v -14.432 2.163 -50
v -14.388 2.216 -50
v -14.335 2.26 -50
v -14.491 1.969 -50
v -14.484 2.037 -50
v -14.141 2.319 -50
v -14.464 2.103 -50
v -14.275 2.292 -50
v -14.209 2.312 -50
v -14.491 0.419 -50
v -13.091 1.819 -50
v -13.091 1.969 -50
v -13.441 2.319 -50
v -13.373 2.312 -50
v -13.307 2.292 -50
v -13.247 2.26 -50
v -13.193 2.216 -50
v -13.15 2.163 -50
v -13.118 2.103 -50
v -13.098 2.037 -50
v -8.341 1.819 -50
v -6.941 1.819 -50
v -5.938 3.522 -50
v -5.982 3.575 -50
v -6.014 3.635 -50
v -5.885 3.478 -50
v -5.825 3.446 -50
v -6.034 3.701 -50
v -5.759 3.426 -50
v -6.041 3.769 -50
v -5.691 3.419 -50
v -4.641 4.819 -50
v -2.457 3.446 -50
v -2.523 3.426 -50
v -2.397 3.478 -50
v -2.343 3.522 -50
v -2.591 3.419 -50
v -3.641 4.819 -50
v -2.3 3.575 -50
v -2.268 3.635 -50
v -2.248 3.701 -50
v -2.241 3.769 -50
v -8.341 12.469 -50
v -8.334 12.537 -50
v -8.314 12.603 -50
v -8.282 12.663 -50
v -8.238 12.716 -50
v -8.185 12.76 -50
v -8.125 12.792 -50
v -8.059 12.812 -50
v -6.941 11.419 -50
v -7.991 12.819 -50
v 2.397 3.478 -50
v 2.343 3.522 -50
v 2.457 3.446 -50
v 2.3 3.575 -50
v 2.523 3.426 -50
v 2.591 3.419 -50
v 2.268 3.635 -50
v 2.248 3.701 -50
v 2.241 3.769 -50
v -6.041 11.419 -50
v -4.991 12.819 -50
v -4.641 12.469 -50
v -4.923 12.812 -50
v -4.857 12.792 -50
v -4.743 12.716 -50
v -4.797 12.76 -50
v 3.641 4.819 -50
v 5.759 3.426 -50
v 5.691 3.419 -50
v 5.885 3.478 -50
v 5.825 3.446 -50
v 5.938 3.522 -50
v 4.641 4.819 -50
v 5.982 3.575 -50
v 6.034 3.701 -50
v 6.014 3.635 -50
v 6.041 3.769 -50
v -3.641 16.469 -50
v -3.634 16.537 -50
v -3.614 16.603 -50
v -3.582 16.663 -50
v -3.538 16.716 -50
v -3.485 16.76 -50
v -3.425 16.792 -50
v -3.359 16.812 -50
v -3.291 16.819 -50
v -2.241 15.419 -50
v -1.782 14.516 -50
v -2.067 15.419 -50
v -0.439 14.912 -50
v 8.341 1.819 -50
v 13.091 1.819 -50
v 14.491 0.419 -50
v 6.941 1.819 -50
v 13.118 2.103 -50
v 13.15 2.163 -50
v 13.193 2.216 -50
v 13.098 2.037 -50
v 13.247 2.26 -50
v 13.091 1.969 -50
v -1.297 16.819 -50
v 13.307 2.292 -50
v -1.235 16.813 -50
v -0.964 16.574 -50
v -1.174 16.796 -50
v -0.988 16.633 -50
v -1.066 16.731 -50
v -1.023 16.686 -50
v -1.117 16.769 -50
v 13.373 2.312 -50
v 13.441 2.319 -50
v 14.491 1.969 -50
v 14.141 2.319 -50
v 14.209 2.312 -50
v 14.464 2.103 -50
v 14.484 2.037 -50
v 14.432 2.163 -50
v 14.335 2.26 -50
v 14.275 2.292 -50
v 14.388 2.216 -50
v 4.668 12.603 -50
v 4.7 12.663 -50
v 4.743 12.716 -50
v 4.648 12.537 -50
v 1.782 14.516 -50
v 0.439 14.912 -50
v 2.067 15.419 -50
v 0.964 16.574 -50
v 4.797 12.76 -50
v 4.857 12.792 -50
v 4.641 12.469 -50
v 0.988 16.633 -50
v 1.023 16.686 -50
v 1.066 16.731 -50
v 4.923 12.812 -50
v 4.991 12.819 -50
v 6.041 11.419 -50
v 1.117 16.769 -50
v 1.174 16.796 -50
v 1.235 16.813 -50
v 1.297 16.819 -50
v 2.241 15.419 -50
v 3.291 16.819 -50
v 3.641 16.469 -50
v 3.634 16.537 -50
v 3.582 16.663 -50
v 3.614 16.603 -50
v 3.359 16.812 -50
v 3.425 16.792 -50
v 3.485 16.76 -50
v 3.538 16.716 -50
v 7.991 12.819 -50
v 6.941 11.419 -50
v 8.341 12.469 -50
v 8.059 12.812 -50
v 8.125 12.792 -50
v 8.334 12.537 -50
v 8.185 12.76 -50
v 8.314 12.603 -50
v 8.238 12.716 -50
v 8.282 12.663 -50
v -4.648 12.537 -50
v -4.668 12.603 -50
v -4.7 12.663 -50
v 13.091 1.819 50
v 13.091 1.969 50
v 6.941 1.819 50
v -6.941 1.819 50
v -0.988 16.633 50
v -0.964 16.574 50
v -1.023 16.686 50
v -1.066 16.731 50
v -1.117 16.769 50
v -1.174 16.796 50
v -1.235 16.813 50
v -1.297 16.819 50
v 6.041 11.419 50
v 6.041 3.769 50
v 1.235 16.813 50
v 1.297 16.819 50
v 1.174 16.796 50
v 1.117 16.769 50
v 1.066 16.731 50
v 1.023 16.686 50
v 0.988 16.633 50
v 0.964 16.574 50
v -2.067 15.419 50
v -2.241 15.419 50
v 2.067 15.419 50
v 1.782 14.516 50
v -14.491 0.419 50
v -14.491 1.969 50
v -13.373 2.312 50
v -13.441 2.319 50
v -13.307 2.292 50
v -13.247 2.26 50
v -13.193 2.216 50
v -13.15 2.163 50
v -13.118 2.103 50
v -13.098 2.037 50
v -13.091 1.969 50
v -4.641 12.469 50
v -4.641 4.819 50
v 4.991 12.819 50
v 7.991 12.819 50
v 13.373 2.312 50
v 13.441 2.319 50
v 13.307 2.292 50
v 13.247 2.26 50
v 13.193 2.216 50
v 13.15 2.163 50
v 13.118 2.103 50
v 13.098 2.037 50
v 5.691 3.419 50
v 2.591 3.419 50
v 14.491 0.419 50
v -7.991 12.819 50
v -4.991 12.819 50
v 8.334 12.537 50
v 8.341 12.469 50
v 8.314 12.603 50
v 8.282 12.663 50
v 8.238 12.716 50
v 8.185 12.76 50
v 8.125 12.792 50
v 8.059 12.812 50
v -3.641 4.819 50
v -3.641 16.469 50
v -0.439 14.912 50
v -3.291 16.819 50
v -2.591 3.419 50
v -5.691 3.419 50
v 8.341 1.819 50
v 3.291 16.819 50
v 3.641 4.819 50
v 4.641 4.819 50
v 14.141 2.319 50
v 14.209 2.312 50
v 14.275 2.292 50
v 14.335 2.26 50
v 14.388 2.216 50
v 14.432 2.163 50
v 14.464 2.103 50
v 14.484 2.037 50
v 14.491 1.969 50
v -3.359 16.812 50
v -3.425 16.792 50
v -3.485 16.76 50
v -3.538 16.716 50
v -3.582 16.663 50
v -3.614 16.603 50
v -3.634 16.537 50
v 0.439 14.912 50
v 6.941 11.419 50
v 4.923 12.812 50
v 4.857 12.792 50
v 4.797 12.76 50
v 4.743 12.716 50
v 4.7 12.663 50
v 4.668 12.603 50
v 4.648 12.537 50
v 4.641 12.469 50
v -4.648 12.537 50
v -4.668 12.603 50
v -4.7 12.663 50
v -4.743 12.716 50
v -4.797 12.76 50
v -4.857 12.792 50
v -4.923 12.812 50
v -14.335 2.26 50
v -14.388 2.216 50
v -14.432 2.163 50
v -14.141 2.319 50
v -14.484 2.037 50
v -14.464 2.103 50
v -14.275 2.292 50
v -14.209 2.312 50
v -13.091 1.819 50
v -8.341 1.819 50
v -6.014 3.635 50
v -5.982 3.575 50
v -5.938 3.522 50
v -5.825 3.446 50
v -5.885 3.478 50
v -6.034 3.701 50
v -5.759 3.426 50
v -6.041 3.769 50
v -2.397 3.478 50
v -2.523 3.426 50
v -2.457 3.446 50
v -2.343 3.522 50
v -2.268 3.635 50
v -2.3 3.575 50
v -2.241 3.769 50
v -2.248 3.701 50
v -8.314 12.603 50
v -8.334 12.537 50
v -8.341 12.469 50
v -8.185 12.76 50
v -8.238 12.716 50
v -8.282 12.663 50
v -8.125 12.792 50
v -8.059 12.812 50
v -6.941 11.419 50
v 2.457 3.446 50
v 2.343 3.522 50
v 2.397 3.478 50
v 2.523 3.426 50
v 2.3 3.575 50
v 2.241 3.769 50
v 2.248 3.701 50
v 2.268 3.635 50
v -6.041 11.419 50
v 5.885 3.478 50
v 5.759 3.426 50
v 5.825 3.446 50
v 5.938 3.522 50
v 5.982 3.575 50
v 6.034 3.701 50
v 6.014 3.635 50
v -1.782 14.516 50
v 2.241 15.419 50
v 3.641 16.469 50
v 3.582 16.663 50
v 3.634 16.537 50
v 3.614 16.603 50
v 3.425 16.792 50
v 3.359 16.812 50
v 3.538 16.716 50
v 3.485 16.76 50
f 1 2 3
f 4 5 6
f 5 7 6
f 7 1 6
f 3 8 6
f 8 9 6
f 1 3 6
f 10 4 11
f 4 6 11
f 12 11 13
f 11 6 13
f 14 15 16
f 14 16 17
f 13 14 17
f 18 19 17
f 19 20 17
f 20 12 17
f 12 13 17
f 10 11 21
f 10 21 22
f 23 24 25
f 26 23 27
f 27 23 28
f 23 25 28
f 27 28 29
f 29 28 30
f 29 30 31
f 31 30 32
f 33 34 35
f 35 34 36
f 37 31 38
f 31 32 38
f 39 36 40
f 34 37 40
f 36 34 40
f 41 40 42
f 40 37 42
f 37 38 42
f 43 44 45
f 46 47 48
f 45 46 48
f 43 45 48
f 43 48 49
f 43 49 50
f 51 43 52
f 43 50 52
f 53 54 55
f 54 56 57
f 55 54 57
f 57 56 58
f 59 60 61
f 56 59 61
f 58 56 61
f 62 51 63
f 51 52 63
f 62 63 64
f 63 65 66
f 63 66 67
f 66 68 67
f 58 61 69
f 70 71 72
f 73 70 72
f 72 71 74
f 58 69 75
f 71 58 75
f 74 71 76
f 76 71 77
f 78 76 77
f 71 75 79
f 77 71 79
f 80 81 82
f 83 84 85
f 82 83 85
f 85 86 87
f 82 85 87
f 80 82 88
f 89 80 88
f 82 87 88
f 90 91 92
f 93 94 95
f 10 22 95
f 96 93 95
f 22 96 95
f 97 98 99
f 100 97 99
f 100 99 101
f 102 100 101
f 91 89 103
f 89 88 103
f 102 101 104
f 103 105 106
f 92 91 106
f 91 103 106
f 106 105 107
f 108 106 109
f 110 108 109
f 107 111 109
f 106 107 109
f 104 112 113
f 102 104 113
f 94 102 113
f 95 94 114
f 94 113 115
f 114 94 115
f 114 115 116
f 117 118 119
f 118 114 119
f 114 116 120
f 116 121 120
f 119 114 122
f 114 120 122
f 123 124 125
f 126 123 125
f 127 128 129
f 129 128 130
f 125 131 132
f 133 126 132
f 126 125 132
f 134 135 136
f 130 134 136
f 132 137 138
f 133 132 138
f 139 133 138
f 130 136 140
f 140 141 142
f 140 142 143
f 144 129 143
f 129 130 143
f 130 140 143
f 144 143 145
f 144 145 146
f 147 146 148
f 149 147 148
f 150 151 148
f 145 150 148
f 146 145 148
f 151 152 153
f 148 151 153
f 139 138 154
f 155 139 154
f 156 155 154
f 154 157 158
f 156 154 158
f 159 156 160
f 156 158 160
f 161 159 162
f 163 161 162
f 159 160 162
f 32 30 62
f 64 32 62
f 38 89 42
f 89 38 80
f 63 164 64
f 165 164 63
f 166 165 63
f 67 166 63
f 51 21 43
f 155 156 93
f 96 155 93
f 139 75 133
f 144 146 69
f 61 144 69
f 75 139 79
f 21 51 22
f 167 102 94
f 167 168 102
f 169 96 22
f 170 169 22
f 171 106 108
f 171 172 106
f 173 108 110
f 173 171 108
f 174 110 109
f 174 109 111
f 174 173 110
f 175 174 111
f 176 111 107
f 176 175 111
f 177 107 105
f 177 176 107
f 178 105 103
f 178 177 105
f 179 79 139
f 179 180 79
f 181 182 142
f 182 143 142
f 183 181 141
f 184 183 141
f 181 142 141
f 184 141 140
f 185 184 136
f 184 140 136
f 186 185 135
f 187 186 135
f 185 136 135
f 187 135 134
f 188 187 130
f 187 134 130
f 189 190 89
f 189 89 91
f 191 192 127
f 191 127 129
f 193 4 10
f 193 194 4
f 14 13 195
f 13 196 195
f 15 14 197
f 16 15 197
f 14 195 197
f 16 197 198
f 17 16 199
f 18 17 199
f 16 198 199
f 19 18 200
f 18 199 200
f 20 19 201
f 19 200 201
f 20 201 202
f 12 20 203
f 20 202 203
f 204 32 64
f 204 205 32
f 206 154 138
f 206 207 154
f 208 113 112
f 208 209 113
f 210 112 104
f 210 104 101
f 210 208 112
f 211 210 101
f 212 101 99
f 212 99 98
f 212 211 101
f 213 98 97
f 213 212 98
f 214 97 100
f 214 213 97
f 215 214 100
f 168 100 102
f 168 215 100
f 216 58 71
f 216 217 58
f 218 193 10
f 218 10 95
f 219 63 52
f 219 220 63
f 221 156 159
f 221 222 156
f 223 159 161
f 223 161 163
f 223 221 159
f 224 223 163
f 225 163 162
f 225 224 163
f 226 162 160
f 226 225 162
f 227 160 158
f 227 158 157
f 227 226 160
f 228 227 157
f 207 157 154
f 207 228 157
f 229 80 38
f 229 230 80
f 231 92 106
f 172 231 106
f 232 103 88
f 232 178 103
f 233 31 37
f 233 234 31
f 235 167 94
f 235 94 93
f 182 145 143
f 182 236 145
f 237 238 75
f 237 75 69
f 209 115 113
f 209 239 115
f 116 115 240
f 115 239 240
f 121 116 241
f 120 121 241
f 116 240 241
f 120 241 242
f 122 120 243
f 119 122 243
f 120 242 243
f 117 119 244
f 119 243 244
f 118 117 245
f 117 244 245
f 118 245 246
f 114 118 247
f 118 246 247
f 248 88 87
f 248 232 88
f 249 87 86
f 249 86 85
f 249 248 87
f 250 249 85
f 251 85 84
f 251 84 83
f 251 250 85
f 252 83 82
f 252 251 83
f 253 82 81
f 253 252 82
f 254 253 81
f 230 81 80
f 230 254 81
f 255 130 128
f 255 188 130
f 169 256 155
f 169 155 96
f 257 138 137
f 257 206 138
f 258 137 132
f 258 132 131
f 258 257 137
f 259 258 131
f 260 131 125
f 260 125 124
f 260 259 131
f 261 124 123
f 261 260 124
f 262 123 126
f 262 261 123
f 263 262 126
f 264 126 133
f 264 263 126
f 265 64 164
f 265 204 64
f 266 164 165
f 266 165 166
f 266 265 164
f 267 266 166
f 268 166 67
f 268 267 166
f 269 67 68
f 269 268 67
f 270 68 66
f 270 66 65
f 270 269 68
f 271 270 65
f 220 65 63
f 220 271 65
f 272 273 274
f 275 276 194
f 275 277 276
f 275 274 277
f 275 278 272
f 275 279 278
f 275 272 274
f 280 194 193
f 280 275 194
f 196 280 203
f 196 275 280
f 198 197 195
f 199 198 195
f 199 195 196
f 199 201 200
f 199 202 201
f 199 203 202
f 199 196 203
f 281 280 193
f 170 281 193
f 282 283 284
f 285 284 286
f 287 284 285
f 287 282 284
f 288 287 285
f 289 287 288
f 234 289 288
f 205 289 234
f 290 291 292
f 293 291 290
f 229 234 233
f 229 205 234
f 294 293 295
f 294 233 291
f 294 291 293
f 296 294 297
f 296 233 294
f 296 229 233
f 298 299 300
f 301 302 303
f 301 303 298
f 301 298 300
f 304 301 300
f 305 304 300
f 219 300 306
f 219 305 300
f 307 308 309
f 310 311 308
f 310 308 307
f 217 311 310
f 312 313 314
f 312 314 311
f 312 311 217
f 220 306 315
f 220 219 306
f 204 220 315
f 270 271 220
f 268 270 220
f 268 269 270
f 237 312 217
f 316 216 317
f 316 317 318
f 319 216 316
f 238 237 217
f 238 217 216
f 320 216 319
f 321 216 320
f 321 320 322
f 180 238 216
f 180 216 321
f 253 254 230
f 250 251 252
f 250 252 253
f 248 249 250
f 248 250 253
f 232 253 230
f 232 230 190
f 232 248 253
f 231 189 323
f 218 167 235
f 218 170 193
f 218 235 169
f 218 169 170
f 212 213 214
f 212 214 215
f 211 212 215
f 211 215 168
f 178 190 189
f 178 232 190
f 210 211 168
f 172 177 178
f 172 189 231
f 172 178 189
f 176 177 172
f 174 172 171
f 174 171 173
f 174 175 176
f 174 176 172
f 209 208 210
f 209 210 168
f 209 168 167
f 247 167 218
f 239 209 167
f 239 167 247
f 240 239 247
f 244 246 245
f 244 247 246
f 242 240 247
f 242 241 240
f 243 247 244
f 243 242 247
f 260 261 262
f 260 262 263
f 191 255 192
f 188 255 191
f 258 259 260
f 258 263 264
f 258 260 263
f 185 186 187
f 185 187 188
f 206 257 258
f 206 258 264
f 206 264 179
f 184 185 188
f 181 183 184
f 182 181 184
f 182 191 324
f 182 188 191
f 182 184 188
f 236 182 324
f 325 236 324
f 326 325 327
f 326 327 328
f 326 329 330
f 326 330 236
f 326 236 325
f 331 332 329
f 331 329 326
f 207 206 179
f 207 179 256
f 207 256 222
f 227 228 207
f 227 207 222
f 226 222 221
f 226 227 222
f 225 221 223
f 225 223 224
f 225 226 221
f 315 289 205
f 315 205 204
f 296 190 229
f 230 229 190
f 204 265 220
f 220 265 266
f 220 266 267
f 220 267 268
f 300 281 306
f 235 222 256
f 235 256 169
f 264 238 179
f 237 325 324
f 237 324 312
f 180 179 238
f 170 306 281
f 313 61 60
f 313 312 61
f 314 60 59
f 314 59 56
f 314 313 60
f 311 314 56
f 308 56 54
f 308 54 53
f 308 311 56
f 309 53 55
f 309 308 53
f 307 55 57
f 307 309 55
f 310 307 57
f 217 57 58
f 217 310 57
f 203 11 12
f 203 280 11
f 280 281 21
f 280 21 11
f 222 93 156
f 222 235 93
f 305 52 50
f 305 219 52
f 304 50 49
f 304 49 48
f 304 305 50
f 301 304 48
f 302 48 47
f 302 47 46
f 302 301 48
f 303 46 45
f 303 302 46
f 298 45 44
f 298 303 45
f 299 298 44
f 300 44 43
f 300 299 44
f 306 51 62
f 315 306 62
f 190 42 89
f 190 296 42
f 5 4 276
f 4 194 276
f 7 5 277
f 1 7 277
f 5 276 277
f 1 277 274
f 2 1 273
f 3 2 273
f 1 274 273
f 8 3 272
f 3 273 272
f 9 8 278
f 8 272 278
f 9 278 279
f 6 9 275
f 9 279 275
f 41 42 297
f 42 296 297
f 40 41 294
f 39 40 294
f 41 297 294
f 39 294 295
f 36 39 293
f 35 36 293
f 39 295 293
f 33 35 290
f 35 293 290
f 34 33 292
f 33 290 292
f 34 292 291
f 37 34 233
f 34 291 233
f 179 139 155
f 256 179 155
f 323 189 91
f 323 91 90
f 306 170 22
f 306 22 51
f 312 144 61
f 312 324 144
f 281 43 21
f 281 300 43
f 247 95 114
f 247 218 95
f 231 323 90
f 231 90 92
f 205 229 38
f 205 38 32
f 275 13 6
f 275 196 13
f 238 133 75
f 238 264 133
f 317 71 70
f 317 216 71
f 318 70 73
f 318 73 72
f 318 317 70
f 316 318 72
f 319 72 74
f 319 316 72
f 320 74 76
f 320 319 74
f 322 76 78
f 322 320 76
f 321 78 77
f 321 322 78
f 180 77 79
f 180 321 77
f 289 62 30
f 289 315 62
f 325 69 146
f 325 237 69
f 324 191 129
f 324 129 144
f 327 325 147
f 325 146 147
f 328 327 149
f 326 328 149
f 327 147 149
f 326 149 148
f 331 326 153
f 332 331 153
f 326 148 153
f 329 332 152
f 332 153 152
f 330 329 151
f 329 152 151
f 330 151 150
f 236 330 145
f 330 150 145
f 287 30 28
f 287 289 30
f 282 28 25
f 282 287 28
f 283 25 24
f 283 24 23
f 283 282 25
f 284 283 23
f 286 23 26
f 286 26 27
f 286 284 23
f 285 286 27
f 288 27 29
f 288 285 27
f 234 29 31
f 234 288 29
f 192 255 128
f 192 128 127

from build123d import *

# Parameters (mm, degrees)
F1_DEPTH = 50
F2_R     = 0.35
F3_R     = 0.35
F4_R     = 0.35
F5_R     = 0.35


with BuildPart() as f1:
    # F0 (on Top) → F1 (new body, symmetric)
    with BuildSketch(Plane.XY):
        Polygon((1.0409717248, 16.8190124818), (0.4387088702, 14.9118471891), (1.7819859847, 14.5164243155), (2.0670138885, 15.4190124818), (2.2409717248, 15.4190124818), (2.2409717248, 3.4190124818), (6.0409717248, 3.4190124818), (6.0409717248, 11.4190124818), (6.9409717248, 11.4190124818), (6.9409717248, 1.8190124818), (-6.9409717248, 1.8190124818), (-6.9409717248, 11.4190124818), (-6.0409717248, 11.4190124818), (-6.0409717248, 3.4190124818), (-2.2409717248, 3.4190124818), (-2.2409717248, 15.4190124818), (-2.0670138885, 15.4190124818), (-1.7819859847, 14.5164243155), (-0.4387088702, 14.9118471891), (-1.0409717248, 16.8190124818), (-3.6409717248, 16.8190124818), (-3.6409717248, 4.8190124818), (-4.6409717248, 4.8190124818), (-4.6409717248, 12.8190124818), (-8.3409717248, 12.8190124818), (-8.3409717248, 1.8190124818), (-13.0909717248, 1.8190124818), (-13.0909717248, 2.3190124818), (-14.4909717248, 2.3190124818), (-14.4909717248, 0.4190124818), (-6.9409717248, 0.4190124818), (6.9409717248, 0.4190124818), (14.4909717248, 0.4190124818), (14.4909717248, 2.3190124818), (13.0909717248, 2.3190124818), (13.0909717248, 1.8190124818), (8.3409717248, 1.8190124818), (8.3409717248, 12.8190124818), (4.6409717248, 12.8190124818), (4.6409717248, 4.8190124818), (3.6409717248, 4.8190124818), (3.6409717248, 16.8190124818), align=None)
    extrude(amount=F1_DEPTH, both=True)

    # F2
    f2_edges = [f1.edges().sort_by_distance(p)[0] for p in [
        (14.490972, 2.319012, 0),
    ]]
    fillet(f2_edges, radius=F2_R)

    # F3
    f3_edges = [f1.edges().sort_by_distance(p)[0] for p in [
        (13.090972, 2.319012, 0),
        (8.340972, 12.819012, 0),
        (4.640972, 12.819012, 0),
        (3.640972, 16.819012, 0),
        (1.040972, 16.819012, 0),
    ]]
    fillet(f3_edges, radius=F3_R)

    # F4
    f4_edges = [f1.edges().sort_by_distance(p)[0] for p in [
        (6.040972, 3.419012, 0),
        (2.240972, 3.419012, 0),
        (-2.240972, 3.419012, 0),
    ]]
    fillet(f4_edges, radius=F4_R)

    # F5
    f5_edges = [f1.edges().sort_by_distance(p)[0] for p in [
        (-6.040972, 3.419012, 0),
        (-8.340972, 12.819012, 0),
        (-14.490972, 2.319012, 0),
        (-3.640972, 16.819012, 0),
        (-1.040972, 16.819012, 0),
        (-4.640972, 12.819012, 0),
        (-13.090972, 2.319012, 0),
    ]]
    fillet(f5_edges, radius=F5_R)


solid = f1.part
